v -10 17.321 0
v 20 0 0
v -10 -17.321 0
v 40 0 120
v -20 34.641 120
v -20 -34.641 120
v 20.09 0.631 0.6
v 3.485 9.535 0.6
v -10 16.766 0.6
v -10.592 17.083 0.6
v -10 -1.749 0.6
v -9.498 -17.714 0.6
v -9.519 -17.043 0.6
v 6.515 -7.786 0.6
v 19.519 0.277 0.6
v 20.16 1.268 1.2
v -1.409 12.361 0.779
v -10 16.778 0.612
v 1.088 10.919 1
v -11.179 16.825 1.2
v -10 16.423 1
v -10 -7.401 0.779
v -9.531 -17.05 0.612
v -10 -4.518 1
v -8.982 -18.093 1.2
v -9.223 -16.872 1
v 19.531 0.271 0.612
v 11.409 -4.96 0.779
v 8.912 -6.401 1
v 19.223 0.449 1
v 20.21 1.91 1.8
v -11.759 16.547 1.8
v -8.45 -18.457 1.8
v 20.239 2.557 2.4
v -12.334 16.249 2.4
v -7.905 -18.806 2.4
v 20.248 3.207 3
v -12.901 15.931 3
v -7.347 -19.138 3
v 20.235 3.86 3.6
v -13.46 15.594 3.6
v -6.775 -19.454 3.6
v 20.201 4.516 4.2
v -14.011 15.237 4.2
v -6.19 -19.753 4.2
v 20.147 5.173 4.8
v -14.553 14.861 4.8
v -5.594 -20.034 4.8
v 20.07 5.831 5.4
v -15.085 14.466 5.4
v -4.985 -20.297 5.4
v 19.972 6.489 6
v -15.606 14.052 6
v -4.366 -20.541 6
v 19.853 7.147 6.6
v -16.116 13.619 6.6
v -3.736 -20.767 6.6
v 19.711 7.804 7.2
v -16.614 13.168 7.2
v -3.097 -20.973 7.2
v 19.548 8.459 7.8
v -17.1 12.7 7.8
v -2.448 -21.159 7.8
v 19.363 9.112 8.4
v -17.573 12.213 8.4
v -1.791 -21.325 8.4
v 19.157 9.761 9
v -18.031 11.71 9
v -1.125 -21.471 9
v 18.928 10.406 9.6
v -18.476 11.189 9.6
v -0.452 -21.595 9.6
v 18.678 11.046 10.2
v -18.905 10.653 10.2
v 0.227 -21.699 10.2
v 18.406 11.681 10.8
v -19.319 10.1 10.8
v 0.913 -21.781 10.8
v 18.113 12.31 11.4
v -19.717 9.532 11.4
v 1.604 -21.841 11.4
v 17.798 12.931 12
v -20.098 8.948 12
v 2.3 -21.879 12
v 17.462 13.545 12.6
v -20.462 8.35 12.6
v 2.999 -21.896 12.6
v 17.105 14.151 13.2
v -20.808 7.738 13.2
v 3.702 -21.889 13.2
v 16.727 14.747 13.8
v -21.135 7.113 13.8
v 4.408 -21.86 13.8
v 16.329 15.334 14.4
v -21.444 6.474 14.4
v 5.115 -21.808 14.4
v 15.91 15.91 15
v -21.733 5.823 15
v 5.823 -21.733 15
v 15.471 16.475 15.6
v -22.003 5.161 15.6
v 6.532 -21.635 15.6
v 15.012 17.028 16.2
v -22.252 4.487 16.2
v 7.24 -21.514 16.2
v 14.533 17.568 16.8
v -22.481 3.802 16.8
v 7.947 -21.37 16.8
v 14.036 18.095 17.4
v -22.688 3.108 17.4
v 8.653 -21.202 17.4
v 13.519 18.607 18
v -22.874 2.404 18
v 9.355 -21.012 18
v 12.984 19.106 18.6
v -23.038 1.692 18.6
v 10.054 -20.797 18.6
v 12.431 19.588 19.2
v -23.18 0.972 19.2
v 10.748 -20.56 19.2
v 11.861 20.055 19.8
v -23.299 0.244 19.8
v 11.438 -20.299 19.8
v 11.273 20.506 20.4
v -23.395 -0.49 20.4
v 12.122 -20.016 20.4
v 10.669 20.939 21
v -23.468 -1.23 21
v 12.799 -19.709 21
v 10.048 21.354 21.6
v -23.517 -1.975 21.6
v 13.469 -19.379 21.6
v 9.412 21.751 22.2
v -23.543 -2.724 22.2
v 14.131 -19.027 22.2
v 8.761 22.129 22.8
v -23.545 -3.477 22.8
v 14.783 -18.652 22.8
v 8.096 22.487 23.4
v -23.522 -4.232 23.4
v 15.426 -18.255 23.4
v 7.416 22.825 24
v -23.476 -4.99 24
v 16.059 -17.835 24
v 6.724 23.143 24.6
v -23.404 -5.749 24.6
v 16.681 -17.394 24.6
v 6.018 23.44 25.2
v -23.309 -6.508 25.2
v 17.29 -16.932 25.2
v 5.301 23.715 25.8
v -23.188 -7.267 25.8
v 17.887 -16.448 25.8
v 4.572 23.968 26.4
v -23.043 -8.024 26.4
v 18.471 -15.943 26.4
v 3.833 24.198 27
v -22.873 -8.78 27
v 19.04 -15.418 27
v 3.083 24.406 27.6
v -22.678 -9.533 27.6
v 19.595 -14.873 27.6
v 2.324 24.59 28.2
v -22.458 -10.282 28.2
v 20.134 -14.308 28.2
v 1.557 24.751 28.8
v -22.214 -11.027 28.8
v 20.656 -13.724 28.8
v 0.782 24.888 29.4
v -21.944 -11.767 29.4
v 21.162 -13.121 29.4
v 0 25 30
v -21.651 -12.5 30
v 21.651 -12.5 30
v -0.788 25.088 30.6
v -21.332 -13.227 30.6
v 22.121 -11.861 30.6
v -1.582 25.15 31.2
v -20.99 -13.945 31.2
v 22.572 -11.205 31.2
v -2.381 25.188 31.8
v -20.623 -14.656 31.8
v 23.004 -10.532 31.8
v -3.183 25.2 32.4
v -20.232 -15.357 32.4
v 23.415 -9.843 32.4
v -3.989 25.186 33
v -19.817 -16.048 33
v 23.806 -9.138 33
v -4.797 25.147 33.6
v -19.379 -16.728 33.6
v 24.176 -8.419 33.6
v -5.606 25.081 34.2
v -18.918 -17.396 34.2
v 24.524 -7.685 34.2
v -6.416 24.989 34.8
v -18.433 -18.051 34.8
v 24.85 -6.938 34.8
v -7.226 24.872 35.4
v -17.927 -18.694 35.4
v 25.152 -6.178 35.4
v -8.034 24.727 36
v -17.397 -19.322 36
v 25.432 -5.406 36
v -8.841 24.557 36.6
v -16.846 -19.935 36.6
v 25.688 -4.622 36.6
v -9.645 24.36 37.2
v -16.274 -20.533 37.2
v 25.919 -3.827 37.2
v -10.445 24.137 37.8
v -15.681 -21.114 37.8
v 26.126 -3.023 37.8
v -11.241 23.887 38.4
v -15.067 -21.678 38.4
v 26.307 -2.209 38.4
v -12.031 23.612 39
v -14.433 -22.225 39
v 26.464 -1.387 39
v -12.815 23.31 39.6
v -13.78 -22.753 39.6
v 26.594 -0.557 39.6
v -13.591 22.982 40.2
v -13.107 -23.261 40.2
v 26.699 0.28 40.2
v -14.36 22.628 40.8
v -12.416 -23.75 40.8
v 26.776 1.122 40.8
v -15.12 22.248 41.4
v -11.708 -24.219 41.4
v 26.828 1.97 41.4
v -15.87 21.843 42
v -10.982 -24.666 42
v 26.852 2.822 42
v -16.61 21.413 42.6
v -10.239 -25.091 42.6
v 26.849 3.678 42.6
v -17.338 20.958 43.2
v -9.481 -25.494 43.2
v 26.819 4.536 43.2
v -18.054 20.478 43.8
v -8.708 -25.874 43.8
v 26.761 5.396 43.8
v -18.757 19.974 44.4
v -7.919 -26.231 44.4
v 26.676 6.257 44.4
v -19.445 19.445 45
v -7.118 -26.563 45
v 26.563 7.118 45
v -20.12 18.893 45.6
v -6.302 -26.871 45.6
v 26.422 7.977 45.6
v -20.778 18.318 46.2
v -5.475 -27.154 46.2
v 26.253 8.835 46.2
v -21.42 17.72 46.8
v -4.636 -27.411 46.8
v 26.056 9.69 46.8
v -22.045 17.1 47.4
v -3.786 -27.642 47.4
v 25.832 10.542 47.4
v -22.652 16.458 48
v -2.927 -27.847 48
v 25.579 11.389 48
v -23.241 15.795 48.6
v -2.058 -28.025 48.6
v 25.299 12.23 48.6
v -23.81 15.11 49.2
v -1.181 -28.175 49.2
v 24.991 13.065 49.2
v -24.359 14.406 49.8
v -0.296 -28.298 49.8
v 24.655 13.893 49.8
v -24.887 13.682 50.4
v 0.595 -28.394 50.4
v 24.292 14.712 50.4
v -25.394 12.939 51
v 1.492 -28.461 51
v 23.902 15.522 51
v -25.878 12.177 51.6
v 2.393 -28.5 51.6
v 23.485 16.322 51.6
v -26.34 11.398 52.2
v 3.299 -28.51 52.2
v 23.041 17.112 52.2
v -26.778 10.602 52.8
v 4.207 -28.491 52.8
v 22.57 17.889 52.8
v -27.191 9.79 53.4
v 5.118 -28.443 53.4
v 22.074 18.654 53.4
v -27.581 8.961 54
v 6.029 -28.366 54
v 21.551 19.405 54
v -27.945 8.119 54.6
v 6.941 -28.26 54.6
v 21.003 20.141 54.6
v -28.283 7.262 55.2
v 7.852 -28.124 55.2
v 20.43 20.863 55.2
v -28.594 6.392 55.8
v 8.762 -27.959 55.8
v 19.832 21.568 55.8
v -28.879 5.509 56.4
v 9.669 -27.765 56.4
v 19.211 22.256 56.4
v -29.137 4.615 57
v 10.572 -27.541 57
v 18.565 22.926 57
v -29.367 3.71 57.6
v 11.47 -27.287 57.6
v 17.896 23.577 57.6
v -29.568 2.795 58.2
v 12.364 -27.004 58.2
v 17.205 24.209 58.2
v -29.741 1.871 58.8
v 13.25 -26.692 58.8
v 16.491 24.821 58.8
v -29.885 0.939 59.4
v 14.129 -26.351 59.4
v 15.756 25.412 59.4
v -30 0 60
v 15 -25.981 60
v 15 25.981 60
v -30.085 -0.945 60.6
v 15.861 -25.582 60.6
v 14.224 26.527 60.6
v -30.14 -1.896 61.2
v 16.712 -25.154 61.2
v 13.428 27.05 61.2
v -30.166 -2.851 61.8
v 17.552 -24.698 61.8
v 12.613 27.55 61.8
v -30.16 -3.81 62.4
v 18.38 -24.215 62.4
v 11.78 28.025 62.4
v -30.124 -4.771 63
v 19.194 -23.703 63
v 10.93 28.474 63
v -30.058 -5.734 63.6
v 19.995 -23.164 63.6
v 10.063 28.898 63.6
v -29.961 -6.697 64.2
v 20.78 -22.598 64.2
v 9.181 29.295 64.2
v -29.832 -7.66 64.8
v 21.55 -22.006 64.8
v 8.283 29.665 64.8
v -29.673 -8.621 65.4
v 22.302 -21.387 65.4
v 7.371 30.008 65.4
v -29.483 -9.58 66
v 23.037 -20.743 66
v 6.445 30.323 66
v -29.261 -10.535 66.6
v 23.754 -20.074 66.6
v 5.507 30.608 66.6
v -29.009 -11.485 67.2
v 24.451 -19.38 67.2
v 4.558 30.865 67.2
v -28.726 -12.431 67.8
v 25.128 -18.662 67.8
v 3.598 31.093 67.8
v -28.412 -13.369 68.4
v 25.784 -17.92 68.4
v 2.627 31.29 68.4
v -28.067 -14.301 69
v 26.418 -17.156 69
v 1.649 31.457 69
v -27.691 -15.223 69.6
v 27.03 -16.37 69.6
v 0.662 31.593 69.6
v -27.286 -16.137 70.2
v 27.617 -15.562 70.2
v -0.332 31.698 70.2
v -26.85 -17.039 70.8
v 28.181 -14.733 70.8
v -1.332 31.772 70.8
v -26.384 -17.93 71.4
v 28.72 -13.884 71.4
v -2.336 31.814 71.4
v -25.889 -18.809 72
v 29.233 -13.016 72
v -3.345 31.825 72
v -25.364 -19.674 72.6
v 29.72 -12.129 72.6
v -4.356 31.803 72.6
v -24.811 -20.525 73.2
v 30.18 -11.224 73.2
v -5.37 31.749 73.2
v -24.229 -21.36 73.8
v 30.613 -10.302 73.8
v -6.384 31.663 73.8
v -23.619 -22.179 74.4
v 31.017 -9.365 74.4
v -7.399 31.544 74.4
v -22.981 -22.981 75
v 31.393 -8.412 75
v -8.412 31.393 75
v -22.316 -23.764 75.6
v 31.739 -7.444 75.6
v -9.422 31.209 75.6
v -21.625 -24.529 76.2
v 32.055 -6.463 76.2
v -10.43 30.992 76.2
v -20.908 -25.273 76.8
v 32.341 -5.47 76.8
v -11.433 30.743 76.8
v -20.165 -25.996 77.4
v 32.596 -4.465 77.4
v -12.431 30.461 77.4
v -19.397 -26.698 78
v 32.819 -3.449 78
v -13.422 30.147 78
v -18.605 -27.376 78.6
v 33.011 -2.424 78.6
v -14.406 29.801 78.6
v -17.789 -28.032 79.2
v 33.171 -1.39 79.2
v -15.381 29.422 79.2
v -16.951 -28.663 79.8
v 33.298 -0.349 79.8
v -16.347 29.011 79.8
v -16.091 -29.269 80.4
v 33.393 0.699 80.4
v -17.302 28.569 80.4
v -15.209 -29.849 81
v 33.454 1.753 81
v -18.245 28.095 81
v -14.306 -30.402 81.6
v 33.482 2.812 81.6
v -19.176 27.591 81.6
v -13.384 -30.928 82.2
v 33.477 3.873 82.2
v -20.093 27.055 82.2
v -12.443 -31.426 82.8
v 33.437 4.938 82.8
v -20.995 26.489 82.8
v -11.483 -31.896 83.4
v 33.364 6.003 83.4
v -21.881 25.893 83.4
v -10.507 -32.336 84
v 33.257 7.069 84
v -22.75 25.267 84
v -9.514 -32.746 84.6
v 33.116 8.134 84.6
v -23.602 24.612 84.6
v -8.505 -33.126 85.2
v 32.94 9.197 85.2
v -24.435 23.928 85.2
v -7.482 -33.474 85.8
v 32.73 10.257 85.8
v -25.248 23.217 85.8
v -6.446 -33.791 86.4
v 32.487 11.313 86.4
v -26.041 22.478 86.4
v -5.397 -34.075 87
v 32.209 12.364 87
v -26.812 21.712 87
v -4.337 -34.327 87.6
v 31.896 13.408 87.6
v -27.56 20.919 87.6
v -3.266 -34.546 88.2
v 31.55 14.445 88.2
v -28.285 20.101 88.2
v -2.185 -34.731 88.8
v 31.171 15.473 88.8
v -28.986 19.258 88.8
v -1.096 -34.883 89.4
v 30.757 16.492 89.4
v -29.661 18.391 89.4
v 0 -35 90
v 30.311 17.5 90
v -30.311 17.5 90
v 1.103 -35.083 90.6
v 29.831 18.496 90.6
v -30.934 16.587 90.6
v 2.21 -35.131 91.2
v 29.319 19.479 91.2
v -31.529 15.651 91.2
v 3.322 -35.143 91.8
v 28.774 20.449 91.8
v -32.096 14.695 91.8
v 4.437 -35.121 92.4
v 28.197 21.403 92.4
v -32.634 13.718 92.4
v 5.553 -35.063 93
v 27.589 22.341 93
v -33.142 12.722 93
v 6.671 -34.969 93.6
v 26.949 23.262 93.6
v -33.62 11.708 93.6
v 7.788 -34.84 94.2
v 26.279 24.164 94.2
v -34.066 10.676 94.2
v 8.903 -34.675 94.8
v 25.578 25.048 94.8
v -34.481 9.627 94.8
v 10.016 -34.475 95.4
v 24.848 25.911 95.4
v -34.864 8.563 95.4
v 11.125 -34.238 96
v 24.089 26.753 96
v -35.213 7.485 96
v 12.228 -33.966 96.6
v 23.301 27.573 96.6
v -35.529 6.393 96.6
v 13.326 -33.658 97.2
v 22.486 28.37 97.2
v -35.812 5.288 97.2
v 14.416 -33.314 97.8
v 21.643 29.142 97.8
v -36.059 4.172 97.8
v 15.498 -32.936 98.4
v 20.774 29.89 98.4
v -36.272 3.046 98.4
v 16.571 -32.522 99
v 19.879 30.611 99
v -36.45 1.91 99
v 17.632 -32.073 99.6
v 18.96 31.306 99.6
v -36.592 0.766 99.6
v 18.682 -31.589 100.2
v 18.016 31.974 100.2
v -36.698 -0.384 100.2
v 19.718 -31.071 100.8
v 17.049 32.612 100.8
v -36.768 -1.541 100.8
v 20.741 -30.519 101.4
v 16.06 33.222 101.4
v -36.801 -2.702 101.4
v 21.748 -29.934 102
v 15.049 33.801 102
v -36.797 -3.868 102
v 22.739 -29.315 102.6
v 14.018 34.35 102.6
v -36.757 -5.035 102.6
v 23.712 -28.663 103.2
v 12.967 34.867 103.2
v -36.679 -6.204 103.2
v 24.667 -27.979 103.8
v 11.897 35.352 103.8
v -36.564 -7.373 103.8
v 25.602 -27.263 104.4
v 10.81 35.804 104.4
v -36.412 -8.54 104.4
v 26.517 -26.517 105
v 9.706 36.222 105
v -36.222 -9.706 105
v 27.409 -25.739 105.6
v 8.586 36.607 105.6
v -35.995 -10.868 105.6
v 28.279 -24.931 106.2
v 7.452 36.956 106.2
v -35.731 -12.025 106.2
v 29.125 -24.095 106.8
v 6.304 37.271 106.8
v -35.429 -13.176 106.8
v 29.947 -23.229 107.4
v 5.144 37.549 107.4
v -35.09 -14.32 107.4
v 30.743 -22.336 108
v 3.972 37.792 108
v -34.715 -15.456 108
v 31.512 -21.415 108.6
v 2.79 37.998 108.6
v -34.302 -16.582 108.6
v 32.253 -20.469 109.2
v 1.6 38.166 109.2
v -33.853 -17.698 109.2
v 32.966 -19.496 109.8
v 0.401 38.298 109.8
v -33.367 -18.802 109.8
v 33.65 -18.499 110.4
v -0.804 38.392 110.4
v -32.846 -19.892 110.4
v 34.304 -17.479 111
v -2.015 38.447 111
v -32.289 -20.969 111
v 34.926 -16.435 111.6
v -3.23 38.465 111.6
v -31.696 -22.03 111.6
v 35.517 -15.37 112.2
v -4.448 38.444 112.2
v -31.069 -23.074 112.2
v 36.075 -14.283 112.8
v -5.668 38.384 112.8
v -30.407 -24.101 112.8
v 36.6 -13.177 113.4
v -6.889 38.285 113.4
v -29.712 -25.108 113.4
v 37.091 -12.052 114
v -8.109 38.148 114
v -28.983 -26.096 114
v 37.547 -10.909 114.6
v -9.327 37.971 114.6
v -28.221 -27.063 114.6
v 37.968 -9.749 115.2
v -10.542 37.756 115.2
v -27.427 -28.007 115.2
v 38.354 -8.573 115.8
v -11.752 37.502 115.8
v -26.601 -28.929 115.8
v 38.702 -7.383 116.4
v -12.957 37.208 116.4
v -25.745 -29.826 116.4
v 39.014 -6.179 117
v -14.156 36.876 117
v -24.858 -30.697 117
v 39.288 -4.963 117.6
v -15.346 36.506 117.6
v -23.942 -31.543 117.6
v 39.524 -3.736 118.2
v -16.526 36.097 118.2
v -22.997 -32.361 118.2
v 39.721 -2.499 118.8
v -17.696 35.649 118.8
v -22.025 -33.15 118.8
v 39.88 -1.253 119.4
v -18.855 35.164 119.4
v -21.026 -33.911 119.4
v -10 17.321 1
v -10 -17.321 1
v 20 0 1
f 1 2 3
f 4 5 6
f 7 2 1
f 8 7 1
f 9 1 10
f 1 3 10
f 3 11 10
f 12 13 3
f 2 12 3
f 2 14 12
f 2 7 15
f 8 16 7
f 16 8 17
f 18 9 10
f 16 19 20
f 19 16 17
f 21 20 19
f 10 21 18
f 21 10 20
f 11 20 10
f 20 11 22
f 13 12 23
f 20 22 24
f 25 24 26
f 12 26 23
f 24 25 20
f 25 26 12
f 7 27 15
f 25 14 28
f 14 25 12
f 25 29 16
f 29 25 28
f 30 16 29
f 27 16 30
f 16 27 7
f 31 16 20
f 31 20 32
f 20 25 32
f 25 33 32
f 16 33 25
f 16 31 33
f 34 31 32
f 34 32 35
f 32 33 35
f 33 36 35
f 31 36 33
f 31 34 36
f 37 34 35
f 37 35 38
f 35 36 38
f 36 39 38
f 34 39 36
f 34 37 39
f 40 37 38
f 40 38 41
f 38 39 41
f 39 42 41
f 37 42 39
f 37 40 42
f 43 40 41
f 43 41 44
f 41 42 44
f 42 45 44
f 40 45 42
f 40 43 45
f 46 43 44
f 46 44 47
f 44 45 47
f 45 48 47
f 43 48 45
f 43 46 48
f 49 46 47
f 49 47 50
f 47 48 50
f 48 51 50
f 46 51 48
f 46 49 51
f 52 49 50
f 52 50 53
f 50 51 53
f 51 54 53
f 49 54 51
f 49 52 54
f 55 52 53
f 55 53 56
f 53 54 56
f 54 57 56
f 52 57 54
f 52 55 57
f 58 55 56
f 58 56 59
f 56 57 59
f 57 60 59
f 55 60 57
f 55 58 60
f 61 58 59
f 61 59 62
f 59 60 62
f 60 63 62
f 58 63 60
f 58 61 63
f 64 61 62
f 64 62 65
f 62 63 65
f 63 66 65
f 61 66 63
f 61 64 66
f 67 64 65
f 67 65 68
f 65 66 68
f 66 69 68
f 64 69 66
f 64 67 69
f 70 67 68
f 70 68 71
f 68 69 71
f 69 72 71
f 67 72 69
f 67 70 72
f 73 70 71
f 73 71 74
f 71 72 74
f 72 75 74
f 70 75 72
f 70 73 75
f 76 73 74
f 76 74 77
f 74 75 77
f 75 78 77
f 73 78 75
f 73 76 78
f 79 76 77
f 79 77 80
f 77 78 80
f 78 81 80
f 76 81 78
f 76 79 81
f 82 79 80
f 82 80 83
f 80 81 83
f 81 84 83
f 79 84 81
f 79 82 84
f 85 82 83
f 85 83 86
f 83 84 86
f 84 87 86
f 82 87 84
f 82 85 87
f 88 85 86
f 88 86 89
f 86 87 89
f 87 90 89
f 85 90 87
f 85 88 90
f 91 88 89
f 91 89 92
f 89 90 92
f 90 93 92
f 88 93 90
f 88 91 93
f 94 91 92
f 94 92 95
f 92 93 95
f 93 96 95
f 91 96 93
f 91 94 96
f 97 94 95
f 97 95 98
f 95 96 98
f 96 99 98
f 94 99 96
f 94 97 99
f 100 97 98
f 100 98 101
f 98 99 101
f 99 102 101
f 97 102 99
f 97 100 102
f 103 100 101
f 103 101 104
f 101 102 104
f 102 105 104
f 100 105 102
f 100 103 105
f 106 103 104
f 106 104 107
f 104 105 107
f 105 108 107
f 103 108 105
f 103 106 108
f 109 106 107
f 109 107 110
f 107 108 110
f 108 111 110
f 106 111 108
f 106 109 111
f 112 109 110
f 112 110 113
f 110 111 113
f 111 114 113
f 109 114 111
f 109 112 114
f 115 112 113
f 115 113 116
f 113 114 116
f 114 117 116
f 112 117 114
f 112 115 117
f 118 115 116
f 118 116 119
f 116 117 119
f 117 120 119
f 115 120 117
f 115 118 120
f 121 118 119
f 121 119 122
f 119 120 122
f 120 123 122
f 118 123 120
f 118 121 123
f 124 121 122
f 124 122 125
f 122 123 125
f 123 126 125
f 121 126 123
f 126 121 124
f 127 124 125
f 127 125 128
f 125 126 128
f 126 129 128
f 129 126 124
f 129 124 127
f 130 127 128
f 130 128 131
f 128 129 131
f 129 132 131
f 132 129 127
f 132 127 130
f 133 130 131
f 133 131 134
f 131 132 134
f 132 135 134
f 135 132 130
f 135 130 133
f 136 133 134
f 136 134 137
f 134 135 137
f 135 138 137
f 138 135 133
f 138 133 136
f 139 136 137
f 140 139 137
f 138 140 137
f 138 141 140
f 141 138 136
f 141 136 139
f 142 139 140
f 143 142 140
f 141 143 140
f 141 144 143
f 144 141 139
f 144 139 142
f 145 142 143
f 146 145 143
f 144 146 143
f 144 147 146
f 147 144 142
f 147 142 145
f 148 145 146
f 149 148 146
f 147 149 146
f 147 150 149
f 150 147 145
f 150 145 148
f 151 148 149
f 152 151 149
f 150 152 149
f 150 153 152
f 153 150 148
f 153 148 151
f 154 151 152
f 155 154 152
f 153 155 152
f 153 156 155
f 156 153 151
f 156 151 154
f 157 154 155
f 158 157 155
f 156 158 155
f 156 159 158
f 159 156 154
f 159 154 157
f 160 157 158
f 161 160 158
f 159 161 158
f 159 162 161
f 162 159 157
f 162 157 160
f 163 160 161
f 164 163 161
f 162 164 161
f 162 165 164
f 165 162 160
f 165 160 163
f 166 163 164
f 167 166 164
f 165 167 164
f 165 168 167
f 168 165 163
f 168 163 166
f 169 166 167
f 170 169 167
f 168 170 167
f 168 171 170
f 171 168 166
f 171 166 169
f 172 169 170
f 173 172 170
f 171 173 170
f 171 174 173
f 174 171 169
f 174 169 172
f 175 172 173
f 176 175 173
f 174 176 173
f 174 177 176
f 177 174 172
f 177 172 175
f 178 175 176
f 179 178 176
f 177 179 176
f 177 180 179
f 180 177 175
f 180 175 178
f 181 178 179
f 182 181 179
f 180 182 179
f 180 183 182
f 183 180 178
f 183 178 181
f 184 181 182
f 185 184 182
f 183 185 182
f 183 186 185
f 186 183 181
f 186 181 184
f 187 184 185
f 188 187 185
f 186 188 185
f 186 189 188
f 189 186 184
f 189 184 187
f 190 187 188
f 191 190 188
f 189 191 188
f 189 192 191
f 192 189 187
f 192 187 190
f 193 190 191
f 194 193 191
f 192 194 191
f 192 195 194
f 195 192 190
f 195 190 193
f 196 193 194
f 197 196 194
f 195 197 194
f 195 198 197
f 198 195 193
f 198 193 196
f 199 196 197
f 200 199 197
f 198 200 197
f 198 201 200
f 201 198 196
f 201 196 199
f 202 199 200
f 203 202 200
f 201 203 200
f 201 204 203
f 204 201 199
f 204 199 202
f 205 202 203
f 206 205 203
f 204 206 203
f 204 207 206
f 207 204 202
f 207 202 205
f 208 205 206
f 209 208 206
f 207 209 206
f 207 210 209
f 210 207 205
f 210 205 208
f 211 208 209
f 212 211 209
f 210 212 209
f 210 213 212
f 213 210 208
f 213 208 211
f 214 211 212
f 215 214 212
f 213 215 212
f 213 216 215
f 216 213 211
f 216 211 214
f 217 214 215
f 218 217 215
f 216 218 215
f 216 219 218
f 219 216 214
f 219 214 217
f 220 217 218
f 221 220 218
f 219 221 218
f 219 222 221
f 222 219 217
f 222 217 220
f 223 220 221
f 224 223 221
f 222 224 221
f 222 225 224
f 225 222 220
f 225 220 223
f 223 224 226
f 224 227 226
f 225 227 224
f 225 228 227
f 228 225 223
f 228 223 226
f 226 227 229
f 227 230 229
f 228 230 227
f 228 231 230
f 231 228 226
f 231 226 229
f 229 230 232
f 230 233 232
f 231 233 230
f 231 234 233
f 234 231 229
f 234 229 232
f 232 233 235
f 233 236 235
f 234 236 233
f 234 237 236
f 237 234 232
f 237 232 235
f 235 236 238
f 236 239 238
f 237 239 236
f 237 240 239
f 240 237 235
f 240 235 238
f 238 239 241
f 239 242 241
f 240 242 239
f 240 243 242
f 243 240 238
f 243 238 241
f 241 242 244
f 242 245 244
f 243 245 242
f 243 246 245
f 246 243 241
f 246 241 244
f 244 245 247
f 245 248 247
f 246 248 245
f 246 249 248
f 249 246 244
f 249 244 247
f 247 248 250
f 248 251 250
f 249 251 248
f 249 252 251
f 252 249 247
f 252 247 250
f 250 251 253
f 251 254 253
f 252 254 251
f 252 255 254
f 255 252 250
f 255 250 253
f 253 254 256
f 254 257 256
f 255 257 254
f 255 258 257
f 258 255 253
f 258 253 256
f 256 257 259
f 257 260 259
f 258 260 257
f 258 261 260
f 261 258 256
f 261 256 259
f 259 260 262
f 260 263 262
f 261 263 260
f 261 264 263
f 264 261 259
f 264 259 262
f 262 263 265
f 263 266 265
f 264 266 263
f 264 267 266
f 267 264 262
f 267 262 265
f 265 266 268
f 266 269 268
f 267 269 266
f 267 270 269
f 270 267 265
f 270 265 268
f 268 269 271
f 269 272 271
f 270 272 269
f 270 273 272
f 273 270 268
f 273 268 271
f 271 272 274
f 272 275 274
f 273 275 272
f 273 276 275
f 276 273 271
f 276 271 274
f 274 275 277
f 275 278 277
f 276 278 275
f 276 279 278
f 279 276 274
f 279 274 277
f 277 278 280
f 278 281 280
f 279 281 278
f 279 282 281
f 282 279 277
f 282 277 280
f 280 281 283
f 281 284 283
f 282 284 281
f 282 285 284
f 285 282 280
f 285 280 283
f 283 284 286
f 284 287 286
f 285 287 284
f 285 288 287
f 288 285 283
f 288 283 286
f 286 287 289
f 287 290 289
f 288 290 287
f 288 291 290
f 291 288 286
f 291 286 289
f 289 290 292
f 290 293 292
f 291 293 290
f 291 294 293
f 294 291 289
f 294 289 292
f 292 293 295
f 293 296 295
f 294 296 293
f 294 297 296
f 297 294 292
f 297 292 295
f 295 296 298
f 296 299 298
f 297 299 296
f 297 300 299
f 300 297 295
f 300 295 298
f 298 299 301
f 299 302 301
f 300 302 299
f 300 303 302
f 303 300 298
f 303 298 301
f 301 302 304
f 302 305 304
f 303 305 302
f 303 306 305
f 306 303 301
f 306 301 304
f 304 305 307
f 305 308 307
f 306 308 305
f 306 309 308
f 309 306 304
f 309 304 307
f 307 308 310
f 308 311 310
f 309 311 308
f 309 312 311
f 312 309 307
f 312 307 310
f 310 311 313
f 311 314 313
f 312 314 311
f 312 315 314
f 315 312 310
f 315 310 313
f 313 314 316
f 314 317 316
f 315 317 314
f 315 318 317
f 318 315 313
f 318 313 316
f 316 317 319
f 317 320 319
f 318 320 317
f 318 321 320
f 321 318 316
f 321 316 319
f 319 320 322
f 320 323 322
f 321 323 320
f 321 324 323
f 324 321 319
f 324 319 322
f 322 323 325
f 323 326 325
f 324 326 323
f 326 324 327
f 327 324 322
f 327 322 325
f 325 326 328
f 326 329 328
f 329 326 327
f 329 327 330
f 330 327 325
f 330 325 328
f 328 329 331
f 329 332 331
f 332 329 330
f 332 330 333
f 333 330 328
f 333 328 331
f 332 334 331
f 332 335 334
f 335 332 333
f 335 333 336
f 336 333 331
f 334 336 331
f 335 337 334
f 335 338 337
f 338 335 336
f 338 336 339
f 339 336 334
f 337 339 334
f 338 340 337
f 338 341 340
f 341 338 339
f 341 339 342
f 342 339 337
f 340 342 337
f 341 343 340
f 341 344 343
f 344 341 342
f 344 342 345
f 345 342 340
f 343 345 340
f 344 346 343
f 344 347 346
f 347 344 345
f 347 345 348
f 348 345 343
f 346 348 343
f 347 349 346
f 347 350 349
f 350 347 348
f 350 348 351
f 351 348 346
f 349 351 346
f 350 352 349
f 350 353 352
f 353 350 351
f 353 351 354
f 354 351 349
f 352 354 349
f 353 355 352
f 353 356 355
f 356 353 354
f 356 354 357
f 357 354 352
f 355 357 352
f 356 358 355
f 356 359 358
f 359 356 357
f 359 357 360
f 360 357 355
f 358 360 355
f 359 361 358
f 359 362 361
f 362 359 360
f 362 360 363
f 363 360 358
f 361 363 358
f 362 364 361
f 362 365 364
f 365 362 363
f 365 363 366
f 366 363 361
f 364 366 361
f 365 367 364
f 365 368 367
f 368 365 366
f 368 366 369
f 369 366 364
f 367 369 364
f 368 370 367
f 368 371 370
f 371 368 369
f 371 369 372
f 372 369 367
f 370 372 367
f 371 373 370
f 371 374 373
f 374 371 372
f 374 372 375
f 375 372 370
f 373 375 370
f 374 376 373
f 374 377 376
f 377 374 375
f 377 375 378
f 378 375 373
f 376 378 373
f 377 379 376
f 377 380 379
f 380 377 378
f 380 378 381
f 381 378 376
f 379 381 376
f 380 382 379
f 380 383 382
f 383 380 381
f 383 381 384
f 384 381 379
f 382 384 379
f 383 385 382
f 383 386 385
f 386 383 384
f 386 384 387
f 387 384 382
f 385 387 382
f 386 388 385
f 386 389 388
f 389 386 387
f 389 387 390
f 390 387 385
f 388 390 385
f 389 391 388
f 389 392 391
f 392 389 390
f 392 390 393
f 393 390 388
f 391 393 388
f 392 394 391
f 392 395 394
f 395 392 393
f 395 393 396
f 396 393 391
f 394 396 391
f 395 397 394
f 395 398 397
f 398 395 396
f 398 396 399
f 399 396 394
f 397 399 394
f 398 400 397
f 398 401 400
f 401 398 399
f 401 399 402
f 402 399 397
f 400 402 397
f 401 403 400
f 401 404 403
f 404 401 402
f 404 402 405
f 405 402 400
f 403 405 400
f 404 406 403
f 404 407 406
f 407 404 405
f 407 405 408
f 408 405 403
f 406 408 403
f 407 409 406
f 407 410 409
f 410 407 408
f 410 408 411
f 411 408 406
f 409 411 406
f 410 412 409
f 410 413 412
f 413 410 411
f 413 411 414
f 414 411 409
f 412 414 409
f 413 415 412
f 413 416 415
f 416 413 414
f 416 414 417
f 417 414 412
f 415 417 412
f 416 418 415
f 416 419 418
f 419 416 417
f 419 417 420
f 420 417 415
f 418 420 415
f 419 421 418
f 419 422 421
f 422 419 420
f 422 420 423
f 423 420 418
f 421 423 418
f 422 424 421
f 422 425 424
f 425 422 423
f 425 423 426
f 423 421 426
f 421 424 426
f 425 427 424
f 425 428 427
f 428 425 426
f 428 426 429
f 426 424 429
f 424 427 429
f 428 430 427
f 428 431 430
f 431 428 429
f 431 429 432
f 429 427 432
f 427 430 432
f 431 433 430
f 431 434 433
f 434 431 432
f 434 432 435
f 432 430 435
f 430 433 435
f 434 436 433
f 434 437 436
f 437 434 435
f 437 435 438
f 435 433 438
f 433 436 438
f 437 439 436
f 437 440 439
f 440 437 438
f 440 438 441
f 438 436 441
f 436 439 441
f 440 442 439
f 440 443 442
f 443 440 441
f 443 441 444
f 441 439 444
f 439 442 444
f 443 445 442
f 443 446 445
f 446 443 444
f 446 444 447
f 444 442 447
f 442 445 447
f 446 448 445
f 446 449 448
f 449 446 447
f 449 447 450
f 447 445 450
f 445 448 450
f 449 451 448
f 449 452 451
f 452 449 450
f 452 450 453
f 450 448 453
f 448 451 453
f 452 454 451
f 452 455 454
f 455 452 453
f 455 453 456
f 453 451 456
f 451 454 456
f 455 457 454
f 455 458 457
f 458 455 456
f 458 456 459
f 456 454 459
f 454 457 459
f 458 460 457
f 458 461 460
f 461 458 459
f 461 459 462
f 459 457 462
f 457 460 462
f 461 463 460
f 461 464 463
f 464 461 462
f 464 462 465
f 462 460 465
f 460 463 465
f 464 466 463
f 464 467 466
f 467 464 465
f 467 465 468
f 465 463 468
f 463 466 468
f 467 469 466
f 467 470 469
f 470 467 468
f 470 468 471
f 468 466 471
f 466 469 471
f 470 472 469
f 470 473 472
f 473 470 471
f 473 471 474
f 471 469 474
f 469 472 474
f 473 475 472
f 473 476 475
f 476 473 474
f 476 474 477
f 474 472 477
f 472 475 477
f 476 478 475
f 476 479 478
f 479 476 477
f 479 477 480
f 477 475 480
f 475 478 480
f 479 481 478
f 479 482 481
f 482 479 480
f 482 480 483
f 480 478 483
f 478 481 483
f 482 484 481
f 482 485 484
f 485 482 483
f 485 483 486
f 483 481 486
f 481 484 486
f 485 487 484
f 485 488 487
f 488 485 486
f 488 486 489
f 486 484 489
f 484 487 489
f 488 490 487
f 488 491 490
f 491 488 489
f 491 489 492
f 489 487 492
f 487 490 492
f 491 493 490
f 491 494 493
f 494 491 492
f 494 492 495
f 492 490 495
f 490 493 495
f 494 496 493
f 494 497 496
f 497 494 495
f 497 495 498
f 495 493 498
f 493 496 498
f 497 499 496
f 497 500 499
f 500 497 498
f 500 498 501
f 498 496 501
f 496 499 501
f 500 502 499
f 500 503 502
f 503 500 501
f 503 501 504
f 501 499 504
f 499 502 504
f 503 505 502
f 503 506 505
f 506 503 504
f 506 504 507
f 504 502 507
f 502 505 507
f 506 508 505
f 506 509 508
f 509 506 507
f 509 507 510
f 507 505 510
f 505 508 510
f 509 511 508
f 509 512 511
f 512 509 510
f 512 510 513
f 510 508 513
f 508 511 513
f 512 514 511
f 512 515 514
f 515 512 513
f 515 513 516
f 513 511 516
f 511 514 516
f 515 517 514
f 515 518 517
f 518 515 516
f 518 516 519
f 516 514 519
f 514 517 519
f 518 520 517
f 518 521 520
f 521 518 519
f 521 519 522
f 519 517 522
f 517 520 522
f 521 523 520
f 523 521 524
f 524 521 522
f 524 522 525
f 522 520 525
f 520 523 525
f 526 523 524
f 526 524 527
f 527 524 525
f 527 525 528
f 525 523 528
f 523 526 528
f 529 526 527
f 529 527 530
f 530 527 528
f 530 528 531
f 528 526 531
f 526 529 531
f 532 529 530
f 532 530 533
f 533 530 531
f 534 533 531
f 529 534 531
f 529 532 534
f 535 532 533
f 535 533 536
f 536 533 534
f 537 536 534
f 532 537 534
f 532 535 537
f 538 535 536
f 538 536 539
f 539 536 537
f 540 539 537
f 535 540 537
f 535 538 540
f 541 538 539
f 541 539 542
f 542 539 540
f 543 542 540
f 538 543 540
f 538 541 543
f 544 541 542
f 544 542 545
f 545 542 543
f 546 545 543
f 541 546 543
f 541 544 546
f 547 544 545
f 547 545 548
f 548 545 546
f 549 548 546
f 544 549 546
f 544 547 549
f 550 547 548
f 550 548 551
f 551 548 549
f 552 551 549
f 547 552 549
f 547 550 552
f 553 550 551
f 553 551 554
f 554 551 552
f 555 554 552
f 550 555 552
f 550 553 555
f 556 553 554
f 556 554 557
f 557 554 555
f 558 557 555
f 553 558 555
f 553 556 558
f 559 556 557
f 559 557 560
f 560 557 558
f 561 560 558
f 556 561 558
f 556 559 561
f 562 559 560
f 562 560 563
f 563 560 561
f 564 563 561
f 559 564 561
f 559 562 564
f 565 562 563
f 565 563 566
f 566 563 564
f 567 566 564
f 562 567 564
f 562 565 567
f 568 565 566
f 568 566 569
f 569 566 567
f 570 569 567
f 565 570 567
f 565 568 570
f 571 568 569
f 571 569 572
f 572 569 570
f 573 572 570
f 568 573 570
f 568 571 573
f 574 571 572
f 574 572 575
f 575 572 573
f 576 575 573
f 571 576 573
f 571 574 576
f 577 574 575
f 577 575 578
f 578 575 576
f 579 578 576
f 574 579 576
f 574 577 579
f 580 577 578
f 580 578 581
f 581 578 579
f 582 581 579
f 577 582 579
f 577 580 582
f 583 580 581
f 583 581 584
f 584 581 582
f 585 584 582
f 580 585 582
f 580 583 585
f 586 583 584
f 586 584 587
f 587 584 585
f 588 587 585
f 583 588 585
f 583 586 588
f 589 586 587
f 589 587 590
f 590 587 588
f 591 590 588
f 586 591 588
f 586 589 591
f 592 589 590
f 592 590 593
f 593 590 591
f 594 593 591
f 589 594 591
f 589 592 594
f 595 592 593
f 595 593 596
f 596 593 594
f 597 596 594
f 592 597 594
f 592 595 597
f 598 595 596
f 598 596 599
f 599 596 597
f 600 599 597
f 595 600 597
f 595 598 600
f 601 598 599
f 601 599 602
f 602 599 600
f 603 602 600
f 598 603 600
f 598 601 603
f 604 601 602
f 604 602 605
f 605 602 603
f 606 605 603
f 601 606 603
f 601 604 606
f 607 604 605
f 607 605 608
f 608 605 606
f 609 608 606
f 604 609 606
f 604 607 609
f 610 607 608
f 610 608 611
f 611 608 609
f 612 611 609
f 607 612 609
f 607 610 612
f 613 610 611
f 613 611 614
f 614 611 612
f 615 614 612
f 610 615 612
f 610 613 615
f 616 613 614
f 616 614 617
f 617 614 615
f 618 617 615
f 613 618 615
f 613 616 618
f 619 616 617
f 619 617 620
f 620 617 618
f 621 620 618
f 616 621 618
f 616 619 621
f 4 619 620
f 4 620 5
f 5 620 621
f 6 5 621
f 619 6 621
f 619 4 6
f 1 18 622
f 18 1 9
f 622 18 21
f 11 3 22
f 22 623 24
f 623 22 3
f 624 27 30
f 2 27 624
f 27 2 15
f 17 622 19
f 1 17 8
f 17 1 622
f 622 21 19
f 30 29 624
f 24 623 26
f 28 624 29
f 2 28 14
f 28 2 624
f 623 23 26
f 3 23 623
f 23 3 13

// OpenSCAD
/* 
 * Rob Mackie's spiral vase prototype openscad file
 * Open this in openscad version 2015.03-1 
 * 
 *  Change any of the numbers in the parameter block
 */

// Parameter block begin
$top_to_bottom_multiplier = 2;   // a mulitplier, no units. 
                                   // The top radius will be this number 
                                   // times the size of the bottom radius. 
                                   // This vase uses this number in both 
                                   // the x and y dimensions. Using different 
                                   // numbers for x and y has interesting effects.
                                   // the top stops being round.
// The difference between the 2 following numbers is likely your wall
// thickness:
$bottom_outer_wall_radius = 20; // in mm
$bottom_inner_wall_radius = 19.5; // in mm
$sides = 3; // number of sides to polygons pretending to be circles
$twist = -360; // degrees top twists compared to bottom
$height = 120; // height in mm.
$slices = 200; // how smooth do you want the twist? try 2, 10 and 200!

// One or both of the following should be set to a non-zero value
// The one that is set to zero won't render and if both are zero, then nothing happens.
$spiral_right = 1;
$spiral_left = 0;

// Parameter block end

// Begin code that you probably only want to touch if you want to
// experiment with different basic concepts.
$fn=$sides;
union() {
    // go left with on vase
    if ($spiral_right) {
        union() {
            // Extrusion takes a 2D shape and drags it through 3D space to make a 
            // 3D shape. 
            linear_extrude(height = $height, twist = $twist, slices = $slices, scale=[$top_to_bottom_multiplier, $top_to_bottom_multiplier]) {
              difference() {
                  circle(r=$bottom_outer_wall_radius);
                 // circle(r=$bottom_inner_wall_radius);
              }
            }
            cylinder(r=$bottom_outer_wall_radius, h=1);
        }
    }
    // go right with the other vase
    if ($spiral_left) {
        union() {
            // Extrusion takes a 2D shape and drags it through 3D space to make a 
            // 3D shape. 
            linear_extrude(height = $height, twist = -$twist, slices = $slices, scale=[$top_to_bottom_multiplier, $top_to_bottom_multiplier]) {
              difference() {
                  circle(r=$bottom_outer_wall_radius);
                  circle(r=$bottom_inner_wall_radius);
              }
            }
            cylinder(r=$bottom_outer_wall_radius, h=1);
        }
    }
}
